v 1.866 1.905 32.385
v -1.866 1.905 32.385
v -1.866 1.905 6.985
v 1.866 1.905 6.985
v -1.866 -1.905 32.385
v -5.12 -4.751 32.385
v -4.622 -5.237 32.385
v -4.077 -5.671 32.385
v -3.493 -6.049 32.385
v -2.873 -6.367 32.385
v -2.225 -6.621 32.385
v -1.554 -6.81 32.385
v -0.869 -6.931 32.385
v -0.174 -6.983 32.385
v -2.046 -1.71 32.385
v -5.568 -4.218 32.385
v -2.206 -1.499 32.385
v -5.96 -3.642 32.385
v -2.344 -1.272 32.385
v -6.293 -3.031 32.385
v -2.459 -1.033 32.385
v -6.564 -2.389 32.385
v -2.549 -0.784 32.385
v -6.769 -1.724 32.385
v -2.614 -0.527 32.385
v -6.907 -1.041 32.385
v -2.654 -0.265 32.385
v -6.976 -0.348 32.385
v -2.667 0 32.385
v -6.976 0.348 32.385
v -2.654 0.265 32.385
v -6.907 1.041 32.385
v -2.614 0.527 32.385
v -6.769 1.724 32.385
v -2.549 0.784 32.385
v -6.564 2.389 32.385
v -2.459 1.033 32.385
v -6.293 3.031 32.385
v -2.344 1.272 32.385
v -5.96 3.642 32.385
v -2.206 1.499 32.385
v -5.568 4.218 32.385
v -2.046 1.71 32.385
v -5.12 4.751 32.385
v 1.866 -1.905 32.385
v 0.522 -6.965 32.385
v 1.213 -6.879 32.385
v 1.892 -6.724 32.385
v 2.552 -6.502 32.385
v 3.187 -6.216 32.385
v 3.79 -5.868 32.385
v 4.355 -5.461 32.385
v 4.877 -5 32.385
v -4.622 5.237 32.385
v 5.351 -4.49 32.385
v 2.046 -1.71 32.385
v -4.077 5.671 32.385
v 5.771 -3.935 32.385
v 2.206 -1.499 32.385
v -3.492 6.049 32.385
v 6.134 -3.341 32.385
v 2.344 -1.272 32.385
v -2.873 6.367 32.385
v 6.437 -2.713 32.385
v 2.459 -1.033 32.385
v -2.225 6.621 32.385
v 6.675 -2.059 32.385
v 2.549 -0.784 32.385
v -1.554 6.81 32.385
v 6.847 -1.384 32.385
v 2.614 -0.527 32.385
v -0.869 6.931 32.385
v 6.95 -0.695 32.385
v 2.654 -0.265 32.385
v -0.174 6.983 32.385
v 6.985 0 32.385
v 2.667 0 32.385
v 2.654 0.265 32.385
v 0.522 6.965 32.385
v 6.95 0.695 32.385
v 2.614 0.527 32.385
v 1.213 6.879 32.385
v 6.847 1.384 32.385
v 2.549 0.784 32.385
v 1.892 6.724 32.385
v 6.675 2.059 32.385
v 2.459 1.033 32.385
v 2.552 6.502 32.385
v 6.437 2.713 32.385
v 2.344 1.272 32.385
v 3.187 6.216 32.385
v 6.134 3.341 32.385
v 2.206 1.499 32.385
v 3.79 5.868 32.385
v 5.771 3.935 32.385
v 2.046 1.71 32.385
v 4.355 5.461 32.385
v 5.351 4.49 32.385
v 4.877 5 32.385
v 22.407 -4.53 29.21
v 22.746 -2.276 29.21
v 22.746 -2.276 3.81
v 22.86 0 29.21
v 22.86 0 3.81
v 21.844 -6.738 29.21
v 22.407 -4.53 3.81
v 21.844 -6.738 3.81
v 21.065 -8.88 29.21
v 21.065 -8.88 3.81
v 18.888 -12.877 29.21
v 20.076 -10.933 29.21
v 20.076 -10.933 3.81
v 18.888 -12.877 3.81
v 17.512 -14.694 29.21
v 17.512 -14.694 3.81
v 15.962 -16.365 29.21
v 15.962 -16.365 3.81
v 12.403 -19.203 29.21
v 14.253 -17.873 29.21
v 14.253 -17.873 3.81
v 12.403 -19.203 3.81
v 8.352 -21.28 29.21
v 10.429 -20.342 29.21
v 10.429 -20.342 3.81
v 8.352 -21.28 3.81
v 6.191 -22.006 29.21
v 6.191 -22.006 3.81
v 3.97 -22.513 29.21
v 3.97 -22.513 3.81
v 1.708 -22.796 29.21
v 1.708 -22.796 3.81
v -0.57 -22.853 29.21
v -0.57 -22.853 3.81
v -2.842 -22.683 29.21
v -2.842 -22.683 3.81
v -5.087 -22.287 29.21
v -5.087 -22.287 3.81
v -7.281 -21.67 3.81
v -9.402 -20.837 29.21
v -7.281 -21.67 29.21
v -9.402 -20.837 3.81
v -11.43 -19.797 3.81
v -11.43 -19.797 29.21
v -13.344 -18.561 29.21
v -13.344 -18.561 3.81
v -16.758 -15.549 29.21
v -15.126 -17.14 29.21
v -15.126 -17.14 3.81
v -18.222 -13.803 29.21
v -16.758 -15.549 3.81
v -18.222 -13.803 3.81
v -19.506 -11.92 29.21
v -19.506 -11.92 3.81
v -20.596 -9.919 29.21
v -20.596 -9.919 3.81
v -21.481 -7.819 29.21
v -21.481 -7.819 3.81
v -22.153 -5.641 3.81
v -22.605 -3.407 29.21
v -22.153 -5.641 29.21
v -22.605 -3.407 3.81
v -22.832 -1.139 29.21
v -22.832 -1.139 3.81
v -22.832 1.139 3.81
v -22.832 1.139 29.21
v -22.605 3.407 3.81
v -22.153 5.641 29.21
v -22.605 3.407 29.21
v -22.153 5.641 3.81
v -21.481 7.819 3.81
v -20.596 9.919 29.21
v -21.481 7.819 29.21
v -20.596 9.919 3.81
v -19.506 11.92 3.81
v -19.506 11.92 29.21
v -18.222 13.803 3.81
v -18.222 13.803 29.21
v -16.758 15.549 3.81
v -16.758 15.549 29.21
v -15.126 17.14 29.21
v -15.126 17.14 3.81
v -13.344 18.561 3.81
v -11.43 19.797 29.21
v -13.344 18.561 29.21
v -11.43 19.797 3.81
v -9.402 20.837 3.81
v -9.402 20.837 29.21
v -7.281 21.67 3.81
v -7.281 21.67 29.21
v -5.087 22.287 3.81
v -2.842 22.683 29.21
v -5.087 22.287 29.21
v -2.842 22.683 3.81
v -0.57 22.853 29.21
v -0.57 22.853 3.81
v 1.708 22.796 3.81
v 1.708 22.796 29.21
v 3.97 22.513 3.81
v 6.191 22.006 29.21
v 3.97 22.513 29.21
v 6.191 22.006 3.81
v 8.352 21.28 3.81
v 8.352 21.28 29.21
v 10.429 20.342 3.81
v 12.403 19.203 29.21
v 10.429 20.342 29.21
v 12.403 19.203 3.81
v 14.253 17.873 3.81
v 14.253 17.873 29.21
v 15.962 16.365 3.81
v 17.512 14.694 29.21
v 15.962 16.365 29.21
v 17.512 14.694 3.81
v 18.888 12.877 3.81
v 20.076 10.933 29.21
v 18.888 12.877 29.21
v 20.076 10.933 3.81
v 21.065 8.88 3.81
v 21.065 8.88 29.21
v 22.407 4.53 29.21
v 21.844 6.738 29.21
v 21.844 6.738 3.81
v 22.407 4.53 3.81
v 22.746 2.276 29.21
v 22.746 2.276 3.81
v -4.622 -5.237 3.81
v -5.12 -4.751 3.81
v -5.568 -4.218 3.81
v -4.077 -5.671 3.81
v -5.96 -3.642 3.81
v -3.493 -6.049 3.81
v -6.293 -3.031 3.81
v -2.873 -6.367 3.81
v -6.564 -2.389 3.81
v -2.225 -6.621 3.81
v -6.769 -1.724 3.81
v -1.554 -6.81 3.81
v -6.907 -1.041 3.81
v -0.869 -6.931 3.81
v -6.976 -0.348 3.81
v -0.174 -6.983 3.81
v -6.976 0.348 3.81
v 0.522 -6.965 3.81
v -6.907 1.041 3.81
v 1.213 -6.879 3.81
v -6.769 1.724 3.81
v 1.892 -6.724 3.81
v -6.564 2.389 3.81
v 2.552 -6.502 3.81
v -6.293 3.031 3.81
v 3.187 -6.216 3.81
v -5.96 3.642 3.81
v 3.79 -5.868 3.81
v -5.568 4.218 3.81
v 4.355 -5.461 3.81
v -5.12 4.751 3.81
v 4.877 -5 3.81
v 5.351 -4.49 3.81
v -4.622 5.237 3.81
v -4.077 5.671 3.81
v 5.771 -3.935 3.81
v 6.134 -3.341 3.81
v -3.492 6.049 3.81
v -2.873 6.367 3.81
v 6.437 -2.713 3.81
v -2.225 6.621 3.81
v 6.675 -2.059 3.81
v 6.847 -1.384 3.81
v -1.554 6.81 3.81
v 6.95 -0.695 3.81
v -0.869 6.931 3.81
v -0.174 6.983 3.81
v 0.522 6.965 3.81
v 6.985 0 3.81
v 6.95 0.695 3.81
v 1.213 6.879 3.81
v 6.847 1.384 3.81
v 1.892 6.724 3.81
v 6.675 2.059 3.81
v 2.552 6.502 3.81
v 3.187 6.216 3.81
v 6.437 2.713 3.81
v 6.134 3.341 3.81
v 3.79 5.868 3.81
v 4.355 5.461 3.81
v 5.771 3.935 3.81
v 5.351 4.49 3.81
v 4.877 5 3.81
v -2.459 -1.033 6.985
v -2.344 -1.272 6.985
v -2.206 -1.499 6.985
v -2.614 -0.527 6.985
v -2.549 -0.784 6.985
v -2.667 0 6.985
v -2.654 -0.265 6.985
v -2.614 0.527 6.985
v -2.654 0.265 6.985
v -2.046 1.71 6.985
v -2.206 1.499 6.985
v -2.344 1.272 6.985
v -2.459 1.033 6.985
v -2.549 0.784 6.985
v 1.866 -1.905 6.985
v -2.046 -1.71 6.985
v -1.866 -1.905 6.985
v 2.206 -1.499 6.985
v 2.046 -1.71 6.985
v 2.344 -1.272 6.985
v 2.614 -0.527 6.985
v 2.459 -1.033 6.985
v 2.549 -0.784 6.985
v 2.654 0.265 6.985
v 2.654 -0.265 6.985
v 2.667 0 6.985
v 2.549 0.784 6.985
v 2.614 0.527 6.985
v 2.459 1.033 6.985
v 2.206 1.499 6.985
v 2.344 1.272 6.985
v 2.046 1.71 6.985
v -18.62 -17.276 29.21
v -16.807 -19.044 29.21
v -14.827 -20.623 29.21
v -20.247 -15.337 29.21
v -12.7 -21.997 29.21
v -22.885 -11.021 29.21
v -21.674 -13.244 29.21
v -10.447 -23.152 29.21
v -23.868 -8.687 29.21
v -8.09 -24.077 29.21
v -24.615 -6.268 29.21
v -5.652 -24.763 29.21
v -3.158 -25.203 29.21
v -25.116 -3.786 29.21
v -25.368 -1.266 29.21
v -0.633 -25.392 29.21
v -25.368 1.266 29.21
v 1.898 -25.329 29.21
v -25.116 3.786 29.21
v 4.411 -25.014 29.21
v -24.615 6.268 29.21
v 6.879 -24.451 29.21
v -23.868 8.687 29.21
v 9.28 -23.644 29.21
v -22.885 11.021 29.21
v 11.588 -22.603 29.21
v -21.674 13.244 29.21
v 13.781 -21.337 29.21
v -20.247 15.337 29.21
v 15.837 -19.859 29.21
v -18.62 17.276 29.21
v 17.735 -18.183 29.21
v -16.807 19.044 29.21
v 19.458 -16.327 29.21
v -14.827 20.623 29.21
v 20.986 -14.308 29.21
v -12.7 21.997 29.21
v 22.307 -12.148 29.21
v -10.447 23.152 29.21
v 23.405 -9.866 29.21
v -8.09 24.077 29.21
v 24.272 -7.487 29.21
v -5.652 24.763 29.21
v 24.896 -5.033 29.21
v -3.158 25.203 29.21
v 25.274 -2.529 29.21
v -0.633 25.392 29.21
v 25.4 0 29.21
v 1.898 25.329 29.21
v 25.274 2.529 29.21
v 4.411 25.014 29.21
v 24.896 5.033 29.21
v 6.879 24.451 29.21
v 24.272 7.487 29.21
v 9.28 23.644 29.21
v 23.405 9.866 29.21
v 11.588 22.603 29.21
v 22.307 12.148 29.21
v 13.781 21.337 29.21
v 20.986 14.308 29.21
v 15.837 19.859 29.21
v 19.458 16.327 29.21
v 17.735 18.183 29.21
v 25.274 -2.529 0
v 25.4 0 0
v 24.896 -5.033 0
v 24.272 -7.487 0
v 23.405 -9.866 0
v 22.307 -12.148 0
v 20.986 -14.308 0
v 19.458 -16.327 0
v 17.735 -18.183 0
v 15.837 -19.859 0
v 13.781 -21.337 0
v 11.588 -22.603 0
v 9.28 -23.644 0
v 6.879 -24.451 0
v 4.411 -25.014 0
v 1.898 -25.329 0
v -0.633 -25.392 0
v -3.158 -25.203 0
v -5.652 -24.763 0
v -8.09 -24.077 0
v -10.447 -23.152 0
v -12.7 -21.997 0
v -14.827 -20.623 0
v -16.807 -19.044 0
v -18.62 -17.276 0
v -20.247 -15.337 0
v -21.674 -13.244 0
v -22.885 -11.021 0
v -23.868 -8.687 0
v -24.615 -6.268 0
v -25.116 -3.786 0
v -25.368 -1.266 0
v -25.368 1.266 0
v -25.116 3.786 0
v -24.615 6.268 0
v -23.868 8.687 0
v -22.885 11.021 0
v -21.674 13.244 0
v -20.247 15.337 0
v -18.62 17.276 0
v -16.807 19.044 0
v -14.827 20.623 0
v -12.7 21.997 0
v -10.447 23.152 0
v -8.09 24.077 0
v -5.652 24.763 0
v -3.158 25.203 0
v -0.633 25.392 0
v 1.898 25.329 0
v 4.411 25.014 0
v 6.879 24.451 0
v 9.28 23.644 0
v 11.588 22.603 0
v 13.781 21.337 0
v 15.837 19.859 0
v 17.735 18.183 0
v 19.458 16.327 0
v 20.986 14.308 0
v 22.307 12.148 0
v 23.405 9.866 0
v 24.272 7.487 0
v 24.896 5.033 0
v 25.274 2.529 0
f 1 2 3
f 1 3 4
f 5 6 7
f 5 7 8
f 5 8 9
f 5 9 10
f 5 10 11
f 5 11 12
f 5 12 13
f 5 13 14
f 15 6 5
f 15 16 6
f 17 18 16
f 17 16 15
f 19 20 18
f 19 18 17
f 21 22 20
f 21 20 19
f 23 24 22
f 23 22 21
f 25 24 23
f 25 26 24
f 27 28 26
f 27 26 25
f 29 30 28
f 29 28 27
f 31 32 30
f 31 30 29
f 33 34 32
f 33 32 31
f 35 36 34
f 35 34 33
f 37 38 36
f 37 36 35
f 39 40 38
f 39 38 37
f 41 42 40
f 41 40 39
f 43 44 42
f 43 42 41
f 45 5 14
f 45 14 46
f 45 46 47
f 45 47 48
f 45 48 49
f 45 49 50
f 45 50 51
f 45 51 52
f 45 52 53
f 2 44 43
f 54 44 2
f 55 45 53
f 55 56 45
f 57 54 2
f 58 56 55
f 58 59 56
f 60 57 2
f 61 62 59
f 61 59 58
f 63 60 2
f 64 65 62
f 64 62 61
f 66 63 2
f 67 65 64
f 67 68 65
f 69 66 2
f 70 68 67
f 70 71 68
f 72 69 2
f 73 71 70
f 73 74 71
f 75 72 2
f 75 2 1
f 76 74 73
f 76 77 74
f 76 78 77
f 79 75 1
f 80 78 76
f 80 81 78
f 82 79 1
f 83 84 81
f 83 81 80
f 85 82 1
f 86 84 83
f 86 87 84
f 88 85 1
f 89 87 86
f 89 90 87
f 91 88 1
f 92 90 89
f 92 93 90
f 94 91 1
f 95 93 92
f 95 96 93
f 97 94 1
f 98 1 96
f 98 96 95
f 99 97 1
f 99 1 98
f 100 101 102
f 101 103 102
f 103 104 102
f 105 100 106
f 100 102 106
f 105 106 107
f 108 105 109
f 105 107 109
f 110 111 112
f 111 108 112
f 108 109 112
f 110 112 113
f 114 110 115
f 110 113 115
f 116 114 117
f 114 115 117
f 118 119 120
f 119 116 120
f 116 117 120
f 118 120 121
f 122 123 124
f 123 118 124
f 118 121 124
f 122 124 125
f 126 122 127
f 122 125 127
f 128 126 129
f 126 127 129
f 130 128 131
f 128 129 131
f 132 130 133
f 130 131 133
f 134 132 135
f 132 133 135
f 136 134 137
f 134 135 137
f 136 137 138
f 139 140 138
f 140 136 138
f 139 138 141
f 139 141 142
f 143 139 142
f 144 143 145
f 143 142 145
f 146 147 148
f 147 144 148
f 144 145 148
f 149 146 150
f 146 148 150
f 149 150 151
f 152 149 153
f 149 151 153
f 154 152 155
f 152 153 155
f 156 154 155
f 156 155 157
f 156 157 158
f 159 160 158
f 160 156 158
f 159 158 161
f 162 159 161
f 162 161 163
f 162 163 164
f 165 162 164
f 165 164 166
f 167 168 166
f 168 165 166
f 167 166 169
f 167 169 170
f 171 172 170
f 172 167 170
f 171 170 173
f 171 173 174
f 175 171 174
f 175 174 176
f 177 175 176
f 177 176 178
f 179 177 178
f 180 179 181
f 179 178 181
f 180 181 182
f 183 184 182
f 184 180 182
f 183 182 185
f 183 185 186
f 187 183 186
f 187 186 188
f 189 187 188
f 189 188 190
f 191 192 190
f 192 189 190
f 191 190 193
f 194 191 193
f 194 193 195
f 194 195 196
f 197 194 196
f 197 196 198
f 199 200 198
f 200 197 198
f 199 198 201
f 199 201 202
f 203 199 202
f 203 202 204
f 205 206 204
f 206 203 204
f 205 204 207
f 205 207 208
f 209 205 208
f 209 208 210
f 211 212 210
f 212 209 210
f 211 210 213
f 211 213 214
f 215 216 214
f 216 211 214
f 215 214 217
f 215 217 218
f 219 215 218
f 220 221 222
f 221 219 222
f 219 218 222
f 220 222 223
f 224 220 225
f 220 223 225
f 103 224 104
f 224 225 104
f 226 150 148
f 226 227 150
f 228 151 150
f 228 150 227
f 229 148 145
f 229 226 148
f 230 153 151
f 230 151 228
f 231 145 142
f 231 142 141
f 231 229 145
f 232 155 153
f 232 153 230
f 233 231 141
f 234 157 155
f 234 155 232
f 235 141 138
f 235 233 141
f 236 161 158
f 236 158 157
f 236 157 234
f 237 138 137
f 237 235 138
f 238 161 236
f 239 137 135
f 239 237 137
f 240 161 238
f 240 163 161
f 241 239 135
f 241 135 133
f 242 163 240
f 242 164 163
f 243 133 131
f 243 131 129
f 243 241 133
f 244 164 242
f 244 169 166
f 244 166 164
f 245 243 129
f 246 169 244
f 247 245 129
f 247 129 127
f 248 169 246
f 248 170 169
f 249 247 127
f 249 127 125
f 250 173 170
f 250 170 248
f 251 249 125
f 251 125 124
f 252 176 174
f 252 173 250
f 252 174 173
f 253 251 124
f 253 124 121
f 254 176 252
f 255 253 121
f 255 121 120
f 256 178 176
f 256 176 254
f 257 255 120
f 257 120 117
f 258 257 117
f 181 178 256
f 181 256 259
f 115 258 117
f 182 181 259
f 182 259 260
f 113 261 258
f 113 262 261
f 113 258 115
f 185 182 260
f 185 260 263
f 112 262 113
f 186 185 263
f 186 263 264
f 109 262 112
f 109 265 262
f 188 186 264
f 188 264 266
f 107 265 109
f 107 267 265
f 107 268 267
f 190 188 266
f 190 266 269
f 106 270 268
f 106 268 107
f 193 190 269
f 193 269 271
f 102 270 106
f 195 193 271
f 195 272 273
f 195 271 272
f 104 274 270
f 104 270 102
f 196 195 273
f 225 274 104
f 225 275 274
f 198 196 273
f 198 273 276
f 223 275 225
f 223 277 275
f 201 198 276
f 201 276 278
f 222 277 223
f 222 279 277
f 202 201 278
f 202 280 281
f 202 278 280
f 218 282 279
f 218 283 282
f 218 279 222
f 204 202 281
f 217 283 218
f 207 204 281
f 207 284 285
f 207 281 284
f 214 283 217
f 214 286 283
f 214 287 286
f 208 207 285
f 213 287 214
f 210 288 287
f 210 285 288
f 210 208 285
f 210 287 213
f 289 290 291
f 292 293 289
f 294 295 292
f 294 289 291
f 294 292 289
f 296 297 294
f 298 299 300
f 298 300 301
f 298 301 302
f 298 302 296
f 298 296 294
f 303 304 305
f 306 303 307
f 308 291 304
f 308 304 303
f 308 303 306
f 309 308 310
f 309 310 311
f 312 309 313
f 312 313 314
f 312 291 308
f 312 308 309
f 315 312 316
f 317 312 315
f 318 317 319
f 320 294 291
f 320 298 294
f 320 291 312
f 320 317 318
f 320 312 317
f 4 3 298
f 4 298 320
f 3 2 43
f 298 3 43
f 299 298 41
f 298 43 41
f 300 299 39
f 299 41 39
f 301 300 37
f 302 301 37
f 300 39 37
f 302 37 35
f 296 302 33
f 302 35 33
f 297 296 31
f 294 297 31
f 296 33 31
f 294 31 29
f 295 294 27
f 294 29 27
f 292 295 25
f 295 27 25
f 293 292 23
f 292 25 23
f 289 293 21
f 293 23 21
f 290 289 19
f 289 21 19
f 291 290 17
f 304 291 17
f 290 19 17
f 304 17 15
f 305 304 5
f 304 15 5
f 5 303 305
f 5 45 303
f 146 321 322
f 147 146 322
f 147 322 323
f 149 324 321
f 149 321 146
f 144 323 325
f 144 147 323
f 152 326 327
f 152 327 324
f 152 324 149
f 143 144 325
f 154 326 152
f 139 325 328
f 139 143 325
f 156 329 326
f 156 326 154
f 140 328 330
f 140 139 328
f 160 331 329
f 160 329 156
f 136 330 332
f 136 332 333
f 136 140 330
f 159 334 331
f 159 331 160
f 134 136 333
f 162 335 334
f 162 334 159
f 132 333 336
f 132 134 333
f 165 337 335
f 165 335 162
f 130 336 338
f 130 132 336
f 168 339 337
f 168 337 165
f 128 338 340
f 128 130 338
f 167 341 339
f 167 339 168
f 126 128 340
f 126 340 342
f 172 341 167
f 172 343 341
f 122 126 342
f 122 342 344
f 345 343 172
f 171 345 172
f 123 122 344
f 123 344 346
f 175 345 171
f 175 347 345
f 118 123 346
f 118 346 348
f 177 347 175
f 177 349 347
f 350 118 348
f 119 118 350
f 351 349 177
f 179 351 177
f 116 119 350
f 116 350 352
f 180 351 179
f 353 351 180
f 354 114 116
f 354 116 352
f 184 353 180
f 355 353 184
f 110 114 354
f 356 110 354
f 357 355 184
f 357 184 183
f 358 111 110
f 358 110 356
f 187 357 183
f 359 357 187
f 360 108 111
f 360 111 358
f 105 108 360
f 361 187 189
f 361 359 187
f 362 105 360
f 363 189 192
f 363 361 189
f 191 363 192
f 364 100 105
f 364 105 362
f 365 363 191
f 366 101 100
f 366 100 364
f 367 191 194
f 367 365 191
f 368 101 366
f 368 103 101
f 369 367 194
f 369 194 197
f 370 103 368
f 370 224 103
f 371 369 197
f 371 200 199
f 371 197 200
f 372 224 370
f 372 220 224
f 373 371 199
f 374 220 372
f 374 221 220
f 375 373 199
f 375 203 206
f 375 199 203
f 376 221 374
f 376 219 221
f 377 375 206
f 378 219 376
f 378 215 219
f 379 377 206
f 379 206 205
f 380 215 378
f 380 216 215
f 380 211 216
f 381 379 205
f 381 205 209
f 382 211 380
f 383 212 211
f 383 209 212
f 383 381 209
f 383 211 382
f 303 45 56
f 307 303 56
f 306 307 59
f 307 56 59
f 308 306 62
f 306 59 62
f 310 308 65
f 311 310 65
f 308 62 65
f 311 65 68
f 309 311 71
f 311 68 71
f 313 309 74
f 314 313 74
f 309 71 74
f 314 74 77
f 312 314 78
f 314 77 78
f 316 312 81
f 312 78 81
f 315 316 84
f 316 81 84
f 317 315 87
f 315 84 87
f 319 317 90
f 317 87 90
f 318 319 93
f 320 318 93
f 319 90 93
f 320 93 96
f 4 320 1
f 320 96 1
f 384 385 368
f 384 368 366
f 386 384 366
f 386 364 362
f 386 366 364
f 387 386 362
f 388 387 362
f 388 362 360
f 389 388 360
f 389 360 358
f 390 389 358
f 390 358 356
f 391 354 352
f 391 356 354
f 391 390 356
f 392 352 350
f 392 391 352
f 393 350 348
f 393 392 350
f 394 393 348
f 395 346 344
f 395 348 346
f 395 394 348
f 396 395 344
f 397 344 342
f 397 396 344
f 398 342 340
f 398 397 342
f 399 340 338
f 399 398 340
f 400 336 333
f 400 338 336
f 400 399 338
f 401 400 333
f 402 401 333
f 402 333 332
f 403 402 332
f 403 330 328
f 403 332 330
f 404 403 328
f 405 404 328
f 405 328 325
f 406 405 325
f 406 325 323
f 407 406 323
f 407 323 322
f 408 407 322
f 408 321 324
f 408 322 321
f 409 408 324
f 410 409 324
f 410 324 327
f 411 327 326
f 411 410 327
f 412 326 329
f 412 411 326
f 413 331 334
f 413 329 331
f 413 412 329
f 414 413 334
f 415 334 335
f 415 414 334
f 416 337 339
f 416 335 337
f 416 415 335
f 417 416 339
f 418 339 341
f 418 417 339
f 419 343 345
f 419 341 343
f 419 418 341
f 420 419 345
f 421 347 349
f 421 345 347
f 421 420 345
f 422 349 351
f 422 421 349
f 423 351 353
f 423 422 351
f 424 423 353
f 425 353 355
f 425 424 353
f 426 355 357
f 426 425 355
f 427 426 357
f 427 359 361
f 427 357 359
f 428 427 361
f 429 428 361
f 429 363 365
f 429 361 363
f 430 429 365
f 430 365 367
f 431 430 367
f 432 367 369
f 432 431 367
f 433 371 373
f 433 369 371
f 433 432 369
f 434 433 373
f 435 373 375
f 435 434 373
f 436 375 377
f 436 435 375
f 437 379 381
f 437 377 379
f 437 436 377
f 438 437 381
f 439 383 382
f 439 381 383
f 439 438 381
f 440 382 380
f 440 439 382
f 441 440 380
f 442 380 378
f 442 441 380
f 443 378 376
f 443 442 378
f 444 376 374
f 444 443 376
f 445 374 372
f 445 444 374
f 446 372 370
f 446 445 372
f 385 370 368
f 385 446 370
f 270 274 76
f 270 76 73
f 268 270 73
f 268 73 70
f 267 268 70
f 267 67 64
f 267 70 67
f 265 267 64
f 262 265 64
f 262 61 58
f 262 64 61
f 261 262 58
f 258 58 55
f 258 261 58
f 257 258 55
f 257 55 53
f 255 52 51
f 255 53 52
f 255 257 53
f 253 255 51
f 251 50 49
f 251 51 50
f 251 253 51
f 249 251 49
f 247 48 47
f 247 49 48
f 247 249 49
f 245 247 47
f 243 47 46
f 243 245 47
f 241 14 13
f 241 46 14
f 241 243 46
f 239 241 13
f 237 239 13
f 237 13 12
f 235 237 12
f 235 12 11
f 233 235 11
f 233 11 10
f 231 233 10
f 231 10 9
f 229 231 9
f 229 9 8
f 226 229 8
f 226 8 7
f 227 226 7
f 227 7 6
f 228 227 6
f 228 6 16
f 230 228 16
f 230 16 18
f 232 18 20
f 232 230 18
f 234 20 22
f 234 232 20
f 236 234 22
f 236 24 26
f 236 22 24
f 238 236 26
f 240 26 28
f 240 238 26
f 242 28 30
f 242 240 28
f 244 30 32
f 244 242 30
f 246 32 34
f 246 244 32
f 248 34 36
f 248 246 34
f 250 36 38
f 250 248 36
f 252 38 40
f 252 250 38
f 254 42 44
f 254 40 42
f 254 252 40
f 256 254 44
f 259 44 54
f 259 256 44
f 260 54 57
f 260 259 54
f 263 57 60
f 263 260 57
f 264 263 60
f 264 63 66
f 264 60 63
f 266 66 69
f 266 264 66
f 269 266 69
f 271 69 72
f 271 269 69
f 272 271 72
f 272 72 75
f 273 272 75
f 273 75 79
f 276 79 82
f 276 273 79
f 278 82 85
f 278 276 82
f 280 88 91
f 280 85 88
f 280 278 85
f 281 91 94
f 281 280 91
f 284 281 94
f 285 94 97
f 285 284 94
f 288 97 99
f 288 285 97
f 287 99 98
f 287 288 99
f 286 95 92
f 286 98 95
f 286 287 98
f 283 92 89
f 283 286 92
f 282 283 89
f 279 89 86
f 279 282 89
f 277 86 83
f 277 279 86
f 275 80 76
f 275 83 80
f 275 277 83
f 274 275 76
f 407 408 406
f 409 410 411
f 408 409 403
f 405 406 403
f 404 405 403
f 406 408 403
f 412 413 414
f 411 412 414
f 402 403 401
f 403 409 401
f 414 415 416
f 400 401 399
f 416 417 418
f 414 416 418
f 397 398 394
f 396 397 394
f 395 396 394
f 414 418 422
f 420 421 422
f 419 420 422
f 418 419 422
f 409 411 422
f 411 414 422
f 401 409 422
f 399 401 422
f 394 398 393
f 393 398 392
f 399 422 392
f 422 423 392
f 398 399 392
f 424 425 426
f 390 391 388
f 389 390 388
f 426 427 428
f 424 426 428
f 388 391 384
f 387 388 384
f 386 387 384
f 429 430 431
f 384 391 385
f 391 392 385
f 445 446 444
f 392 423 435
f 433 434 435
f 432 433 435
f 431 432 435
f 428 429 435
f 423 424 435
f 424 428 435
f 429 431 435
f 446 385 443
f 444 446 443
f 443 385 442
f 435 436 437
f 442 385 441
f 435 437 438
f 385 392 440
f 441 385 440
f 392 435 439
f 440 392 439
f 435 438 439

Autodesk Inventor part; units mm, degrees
ref_plane "YZ Plane" through (0, 0, 0) normal (1, 0, 0) x (0, 1, 0)
ref_plane "XZ Plane" through (0, 0, 0) normal (0, 1, 0) x (-1, 0, 0)
ref_plane "XY Plane" through (0, 0, 0) normal (0, 0, 1) x (1, 0, 0)
sketch "Sketch1" plane through (0, 0, 0) normal (0, 0, 1) x (1, 0, 0)
  circle A0 centre (0, 0) radius 25.4
  dimension "d0" = 50.8
extrude "Extrusion1" add sketch "Sketch1" along normal blind 3.81
sketch "Sketch2" plane through (0, 0, 3.81) normal (0, 0, 1) x (1, 0, 0)
  circle A0 centre (0, 0) radius 22.86
  circle A1 centre (0, 0) radius 25.4
  dimension "d3" = 45.72
extrude "Extrusion2" add sketch "Sketch2" along normal blind 25.4
sketch "Sketch3" plane through (0, 0, 3.81) normal (0, 0, 1) x (1, 0, 0)
  circle A0 centre (0, 0) radius 6.985
  dimension "d6" = 13.97
extrude "Extrusion3" add sketch "Sketch3" along normal blind 28.575
sketch "Sketch4" plane through (0, 0, 32.385) normal (0, 0, 1) x (1, 0, 0)
  line L0 (-1.8665, 1.905) -> (1.8665, 1.905)
  line L1 (1.8665, -1.905) -> (-1.8665, -1.905)
  arc A0 (-1.8665, 1.905) -> (-1.8665, -1.905) centre (0, 0) ccw
  arc A1 (1.8665, -1.905) -> (1.8665, 1.905) centre (0, 0) ccw
  point P0 (0, 1.905)
  point P1 (0, -1.905)
  dimension "d10" = 1.905
  dimension "d11" = 1.905
extrude "Extrusion4" cut sketch "Sketch4" against normal blind 25.4
properties part number "Wheel" material "ABS Plastic"
